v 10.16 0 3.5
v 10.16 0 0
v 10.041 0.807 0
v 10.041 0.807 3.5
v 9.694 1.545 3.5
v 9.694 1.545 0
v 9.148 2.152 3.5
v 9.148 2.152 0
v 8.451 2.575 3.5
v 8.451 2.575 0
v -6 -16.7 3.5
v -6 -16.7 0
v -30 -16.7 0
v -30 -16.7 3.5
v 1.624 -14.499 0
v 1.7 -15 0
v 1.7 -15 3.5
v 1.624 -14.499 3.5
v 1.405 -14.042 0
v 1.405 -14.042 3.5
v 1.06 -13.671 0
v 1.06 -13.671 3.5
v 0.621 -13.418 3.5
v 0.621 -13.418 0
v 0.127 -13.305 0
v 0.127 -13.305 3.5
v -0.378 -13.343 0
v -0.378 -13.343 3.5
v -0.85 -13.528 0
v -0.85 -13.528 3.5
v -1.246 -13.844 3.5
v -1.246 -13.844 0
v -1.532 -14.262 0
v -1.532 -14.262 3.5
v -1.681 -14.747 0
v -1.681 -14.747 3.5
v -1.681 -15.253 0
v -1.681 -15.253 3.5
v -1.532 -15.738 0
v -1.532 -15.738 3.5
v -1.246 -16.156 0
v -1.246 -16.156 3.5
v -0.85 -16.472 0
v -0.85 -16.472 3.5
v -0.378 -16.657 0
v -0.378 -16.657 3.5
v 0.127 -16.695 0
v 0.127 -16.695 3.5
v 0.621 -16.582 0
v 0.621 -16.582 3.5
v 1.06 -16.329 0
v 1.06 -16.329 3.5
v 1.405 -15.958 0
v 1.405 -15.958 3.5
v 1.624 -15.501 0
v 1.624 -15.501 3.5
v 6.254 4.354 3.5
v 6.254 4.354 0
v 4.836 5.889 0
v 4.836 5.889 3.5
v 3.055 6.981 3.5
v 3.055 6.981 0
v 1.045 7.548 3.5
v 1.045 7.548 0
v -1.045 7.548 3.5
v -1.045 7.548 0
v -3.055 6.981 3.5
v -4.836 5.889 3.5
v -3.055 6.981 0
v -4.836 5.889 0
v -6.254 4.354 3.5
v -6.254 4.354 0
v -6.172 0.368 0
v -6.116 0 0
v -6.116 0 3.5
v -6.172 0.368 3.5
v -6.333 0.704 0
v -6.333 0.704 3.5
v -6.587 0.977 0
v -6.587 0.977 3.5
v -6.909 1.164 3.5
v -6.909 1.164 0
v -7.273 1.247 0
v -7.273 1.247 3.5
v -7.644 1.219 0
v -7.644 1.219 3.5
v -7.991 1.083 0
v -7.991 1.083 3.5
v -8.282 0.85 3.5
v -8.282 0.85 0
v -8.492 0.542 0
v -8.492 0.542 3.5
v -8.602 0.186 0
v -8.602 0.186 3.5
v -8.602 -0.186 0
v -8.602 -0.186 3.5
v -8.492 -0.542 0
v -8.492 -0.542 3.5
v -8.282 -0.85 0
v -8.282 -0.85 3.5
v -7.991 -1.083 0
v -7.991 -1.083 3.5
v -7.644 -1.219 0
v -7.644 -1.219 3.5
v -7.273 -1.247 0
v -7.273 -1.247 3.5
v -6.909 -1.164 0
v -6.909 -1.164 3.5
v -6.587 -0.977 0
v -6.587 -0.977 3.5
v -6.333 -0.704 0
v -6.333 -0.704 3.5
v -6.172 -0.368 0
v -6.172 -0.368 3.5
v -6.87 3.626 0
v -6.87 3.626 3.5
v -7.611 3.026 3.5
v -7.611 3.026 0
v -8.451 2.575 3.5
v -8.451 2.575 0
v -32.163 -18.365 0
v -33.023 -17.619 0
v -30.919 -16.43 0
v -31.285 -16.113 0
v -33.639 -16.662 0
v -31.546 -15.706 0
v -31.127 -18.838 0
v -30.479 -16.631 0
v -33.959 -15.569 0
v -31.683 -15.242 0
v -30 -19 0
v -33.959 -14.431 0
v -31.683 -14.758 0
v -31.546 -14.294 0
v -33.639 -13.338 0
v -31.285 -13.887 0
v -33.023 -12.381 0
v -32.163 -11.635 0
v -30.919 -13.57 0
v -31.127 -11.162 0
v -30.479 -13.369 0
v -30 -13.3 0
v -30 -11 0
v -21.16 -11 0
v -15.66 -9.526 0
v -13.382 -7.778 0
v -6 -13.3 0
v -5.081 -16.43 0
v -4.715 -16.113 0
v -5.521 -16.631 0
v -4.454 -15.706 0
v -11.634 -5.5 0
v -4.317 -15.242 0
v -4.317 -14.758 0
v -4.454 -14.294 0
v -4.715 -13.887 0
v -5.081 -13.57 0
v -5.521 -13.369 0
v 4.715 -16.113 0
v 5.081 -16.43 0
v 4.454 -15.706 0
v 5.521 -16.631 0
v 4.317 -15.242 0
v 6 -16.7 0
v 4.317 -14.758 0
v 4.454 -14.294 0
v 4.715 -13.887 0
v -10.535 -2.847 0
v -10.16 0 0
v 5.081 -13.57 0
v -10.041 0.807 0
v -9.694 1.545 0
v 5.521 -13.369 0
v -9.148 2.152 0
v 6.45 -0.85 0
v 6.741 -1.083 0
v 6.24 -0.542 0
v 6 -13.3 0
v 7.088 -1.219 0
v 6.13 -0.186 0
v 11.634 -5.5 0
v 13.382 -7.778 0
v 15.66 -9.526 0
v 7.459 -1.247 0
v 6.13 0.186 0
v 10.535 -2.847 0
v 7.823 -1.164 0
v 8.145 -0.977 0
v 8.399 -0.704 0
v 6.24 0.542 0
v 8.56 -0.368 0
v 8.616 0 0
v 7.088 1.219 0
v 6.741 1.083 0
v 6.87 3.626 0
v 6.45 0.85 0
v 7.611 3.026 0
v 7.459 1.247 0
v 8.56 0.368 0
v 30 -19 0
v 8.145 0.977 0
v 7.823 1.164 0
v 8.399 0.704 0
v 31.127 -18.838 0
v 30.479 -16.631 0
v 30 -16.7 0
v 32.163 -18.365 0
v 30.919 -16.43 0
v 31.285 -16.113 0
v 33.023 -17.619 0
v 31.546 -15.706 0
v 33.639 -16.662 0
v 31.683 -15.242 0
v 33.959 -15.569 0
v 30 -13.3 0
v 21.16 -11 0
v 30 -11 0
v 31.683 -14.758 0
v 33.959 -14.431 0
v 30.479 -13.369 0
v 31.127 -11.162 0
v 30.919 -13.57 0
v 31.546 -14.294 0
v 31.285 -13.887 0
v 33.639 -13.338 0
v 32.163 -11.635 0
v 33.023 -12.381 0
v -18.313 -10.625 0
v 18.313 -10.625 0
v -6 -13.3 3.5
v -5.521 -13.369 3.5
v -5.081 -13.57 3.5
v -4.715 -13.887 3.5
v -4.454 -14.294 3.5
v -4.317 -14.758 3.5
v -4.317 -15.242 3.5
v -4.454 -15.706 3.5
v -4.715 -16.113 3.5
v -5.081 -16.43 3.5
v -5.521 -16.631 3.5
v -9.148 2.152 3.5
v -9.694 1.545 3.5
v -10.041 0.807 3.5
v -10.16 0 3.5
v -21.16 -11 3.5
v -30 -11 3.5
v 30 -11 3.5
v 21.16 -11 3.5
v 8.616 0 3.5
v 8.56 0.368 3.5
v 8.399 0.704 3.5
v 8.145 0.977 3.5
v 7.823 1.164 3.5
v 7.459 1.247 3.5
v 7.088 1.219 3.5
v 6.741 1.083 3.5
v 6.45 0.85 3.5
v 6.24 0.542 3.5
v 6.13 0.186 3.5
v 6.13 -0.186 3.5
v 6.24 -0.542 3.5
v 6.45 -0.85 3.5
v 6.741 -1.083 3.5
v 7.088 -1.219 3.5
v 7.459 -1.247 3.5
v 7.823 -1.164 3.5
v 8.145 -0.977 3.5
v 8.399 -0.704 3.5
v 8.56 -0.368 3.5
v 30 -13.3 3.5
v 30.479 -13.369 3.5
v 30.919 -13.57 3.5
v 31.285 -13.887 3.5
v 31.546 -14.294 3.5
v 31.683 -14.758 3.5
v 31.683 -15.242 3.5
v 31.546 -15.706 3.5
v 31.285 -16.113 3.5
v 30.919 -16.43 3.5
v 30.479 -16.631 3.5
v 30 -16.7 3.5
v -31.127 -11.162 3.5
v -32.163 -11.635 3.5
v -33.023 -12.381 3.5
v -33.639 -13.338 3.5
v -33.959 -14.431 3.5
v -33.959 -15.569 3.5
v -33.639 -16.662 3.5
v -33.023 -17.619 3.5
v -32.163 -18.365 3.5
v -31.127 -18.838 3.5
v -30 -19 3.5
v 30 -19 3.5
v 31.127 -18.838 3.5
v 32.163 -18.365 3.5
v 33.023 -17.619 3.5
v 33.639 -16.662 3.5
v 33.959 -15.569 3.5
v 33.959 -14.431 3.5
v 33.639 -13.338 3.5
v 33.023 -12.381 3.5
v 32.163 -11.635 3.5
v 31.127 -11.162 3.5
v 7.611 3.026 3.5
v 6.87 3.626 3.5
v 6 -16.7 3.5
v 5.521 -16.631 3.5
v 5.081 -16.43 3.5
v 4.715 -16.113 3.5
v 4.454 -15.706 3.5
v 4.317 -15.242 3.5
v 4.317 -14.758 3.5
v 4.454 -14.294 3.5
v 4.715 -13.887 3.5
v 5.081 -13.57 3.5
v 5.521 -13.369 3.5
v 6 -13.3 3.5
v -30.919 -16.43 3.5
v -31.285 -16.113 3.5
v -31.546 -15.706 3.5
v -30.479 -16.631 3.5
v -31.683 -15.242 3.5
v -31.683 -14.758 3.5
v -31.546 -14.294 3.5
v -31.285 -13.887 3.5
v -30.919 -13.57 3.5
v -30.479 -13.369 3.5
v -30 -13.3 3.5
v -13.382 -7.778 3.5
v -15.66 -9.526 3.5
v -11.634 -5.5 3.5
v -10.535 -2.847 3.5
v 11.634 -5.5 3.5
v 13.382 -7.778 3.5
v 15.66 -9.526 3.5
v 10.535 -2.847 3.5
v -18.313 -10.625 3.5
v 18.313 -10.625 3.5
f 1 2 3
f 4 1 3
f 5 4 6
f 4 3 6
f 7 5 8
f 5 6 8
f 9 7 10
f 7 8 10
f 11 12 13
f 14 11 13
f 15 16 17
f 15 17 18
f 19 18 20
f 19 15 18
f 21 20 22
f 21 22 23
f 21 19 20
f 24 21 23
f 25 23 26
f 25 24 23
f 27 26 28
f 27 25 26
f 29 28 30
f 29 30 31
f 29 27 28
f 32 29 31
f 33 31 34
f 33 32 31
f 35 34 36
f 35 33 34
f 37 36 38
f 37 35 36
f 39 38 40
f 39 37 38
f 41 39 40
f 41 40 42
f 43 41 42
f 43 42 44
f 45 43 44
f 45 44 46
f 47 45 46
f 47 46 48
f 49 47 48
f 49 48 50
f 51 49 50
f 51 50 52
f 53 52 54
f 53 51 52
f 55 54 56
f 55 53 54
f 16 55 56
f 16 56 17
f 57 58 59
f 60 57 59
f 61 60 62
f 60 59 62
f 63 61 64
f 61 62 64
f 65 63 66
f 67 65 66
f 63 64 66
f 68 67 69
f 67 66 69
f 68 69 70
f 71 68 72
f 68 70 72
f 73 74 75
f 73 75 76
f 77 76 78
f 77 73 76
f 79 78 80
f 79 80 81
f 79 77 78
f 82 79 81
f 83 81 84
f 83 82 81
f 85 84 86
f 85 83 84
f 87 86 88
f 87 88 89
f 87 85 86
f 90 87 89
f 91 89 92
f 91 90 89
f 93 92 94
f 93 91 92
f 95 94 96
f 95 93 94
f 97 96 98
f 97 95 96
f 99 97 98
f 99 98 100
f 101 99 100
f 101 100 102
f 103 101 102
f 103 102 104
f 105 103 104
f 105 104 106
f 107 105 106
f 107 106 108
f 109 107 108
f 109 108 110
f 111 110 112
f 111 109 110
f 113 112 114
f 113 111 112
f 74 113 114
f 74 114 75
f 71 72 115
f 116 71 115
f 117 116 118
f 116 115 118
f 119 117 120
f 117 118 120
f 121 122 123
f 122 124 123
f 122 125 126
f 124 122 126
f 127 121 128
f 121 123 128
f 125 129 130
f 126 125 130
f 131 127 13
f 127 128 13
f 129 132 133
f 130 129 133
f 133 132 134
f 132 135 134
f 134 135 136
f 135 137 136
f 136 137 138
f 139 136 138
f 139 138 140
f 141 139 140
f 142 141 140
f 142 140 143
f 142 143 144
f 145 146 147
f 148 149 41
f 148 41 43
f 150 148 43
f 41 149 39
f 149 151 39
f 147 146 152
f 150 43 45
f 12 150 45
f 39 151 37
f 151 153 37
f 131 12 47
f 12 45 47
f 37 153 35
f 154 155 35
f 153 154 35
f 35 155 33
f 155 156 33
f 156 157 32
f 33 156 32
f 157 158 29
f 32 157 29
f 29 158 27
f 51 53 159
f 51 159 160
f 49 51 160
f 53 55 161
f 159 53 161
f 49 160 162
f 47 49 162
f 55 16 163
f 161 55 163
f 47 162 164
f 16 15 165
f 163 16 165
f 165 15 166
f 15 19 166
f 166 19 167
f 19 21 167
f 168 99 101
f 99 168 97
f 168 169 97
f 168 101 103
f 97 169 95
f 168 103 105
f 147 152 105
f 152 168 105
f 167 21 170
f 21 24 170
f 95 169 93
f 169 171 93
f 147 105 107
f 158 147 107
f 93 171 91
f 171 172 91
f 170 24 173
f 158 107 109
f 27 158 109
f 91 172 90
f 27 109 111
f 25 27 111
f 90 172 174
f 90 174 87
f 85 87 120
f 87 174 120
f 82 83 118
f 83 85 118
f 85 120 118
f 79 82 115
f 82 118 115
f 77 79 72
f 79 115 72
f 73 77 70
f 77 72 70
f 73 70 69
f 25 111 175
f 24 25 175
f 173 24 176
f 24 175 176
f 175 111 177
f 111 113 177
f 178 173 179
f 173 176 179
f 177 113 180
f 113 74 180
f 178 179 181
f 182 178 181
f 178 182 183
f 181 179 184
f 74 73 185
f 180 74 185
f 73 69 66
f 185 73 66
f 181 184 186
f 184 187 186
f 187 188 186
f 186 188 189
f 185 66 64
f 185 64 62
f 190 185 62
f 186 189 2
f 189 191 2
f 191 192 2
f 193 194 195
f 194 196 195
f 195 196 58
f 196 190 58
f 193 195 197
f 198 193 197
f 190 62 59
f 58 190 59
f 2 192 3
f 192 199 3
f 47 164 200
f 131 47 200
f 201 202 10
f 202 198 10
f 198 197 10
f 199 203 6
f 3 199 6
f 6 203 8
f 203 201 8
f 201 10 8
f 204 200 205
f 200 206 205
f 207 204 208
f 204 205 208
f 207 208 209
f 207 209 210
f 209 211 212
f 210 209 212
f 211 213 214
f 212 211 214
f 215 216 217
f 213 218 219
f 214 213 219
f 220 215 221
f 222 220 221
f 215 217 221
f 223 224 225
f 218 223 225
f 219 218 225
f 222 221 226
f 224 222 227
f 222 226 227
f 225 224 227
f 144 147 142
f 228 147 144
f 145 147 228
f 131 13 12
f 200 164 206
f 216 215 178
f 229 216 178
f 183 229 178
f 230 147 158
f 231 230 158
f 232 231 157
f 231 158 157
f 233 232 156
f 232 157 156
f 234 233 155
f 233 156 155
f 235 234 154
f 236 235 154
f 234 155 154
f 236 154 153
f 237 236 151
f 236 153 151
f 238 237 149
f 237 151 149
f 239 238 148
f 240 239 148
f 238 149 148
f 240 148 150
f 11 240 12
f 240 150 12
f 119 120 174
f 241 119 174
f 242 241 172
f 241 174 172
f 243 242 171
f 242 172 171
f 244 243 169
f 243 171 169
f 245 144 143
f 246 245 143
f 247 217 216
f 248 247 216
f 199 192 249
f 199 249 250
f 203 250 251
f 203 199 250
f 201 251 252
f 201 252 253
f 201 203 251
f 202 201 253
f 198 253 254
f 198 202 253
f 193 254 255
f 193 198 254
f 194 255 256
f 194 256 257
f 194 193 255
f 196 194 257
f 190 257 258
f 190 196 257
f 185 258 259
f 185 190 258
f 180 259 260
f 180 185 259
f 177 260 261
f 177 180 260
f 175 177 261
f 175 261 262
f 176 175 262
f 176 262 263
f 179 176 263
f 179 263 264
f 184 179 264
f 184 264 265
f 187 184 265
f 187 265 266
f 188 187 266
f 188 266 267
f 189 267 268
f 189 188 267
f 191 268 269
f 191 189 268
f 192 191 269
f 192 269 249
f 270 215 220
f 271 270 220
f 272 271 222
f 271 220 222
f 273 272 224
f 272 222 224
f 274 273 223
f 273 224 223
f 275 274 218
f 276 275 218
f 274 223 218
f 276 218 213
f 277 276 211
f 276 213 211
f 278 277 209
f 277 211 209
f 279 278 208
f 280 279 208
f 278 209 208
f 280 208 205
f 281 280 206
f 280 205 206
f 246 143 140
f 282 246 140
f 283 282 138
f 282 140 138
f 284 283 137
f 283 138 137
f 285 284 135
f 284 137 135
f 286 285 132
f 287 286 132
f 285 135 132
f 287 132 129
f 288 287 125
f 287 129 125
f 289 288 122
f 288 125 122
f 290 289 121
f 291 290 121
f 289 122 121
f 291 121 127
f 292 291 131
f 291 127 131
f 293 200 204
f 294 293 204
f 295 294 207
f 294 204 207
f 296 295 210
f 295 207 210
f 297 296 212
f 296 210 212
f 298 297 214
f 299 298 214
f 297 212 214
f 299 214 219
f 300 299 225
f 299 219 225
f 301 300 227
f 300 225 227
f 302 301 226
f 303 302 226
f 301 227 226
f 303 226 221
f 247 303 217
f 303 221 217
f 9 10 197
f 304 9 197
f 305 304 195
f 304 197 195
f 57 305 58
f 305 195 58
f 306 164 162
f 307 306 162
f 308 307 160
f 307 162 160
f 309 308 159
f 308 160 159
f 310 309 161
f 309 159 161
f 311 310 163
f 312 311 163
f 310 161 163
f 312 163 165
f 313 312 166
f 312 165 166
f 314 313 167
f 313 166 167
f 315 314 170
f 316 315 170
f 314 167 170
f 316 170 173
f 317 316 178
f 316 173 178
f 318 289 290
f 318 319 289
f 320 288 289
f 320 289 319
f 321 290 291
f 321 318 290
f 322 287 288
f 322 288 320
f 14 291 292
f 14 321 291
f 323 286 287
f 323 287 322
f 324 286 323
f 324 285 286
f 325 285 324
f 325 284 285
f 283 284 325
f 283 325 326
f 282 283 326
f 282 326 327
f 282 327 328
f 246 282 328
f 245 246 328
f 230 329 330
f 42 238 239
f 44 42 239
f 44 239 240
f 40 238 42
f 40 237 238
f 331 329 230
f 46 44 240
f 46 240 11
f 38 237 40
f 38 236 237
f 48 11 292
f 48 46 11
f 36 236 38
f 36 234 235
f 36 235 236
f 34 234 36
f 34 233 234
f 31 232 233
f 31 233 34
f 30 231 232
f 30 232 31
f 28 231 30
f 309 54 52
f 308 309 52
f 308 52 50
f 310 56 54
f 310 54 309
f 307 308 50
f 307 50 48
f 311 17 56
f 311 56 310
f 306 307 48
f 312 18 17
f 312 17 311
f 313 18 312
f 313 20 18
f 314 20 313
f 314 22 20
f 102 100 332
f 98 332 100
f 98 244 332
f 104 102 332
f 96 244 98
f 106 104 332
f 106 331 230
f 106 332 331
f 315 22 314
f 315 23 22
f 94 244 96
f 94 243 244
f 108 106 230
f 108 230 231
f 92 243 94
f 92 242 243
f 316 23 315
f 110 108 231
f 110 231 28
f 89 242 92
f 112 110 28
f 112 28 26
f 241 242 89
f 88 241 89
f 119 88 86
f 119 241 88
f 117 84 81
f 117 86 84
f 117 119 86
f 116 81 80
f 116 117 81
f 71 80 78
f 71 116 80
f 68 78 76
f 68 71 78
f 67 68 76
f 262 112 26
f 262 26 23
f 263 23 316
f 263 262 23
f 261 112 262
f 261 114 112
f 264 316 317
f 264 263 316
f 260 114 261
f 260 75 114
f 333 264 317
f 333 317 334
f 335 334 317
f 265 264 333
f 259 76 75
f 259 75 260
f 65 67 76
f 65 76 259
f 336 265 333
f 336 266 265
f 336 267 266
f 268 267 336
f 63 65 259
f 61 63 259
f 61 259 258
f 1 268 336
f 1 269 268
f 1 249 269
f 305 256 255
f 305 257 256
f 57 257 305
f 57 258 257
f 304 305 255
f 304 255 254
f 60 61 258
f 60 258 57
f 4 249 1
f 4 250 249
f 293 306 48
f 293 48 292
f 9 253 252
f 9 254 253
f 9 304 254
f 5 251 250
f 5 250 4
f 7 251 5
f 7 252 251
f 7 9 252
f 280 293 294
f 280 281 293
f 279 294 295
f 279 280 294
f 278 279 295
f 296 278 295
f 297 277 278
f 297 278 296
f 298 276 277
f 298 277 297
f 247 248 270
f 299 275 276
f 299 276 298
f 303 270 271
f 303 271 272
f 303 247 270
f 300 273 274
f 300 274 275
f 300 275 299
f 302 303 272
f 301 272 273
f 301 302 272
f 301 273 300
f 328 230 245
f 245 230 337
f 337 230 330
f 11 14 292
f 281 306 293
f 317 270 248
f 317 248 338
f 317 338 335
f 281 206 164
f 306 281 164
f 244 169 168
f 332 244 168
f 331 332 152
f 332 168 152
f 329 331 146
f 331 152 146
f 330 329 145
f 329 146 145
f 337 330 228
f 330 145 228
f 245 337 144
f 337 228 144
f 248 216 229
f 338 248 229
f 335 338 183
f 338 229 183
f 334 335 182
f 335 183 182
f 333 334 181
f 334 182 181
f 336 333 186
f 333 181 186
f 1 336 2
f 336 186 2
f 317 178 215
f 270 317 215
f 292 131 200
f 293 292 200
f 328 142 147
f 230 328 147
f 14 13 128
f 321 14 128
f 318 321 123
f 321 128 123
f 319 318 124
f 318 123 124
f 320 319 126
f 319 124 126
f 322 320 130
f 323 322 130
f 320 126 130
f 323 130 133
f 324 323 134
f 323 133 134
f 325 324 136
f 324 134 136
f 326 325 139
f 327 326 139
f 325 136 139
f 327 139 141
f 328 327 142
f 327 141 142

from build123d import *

# Parameters (mm, degrees)
SKETCH1_R           = 1.25
SKETCH1_R_2         = 1.7
BOSS_EXTRUDE1_DEPTH = 3.5


with BuildPart() as part:
    # Sketch1 → Boss-Extrude1 (new body)
    with BuildSketch(Plane.XY):
        with BuildLine():
            Line((-30, -19), (30, -19))
            ThreePointArc((30, -19), (34, -15), (30, -11))
            Line((30, -11), (21.16, -11))
            ThreePointArc((21.16, -11), (13.381825407, -7.778174593), (10.16, 0))
            ThreePointArc((10.16, 0), (9.693763482, 1.54530035), (8.450656284, 2.574870238))
            ThreePointArc((8.450656284, 2.574870238), (7.225912675, 3.308465338), (6.253653028, 4.35387))
            ThreePointArc((6.253653028, 4.35387), (0, 7.619997387), (-6.253653028, 4.353870001))
            ThreePointArc((-6.253653028, 4.353870001), (-7.225911419, 3.308463788), (-8.450654495, 2.574865992))
            ThreePointArc((-8.450654495, 2.574865992), (-9.693759643, 1.545297801), (-10.159995392, 0))
            ThreePointArc((-10.159995392, 0), (-13.381820799, -7.778174593), (-21.159995392, -11))
            Line((-21.159995392, -11), (-30, -11))
            ThreePointArc((-30, -11), (-34, -15), (-30, -19))
        make_face()
        with Locations((-7.366, 0)):
            Circle(SKETCH1_R, mode=Mode.SUBTRACT)
        with Locations((7.366, 0)):
            Circle(SKETCH1_R, mode=Mode.SUBTRACT)
        with Locations((0, -15)):
            Circle(SKETCH1_R_2, mode=Mode.SUBTRACT)
        with BuildLine():
            Line((-30, -13.3), (-6, -13.3))
            ThreePointArc((-6, -13.3), (-4.3, -15), (-6, -16.7))
            Line((-6, -16.7), (-30, -16.7))
            ThreePointArc((-30, -16.7), (-31.7, -15), (-30, -13.3))
        make_face(mode=Mode.SUBTRACT)
        with BuildLine():
            Line((30, -16.7), (6, -16.7))
            ThreePointArc((6, -16.7), (4.3, -15), (6, -13.3))
            Line((6, -13.3), (30, -13.3))
            ThreePointArc((30, -13.3), (31.7, -15), (30, -16.7))
        make_face(mode=Mode.SUBTRACT)
    extrude(amount=BOSS_EXTRUDE1_DEPTH)


solid = part.part
